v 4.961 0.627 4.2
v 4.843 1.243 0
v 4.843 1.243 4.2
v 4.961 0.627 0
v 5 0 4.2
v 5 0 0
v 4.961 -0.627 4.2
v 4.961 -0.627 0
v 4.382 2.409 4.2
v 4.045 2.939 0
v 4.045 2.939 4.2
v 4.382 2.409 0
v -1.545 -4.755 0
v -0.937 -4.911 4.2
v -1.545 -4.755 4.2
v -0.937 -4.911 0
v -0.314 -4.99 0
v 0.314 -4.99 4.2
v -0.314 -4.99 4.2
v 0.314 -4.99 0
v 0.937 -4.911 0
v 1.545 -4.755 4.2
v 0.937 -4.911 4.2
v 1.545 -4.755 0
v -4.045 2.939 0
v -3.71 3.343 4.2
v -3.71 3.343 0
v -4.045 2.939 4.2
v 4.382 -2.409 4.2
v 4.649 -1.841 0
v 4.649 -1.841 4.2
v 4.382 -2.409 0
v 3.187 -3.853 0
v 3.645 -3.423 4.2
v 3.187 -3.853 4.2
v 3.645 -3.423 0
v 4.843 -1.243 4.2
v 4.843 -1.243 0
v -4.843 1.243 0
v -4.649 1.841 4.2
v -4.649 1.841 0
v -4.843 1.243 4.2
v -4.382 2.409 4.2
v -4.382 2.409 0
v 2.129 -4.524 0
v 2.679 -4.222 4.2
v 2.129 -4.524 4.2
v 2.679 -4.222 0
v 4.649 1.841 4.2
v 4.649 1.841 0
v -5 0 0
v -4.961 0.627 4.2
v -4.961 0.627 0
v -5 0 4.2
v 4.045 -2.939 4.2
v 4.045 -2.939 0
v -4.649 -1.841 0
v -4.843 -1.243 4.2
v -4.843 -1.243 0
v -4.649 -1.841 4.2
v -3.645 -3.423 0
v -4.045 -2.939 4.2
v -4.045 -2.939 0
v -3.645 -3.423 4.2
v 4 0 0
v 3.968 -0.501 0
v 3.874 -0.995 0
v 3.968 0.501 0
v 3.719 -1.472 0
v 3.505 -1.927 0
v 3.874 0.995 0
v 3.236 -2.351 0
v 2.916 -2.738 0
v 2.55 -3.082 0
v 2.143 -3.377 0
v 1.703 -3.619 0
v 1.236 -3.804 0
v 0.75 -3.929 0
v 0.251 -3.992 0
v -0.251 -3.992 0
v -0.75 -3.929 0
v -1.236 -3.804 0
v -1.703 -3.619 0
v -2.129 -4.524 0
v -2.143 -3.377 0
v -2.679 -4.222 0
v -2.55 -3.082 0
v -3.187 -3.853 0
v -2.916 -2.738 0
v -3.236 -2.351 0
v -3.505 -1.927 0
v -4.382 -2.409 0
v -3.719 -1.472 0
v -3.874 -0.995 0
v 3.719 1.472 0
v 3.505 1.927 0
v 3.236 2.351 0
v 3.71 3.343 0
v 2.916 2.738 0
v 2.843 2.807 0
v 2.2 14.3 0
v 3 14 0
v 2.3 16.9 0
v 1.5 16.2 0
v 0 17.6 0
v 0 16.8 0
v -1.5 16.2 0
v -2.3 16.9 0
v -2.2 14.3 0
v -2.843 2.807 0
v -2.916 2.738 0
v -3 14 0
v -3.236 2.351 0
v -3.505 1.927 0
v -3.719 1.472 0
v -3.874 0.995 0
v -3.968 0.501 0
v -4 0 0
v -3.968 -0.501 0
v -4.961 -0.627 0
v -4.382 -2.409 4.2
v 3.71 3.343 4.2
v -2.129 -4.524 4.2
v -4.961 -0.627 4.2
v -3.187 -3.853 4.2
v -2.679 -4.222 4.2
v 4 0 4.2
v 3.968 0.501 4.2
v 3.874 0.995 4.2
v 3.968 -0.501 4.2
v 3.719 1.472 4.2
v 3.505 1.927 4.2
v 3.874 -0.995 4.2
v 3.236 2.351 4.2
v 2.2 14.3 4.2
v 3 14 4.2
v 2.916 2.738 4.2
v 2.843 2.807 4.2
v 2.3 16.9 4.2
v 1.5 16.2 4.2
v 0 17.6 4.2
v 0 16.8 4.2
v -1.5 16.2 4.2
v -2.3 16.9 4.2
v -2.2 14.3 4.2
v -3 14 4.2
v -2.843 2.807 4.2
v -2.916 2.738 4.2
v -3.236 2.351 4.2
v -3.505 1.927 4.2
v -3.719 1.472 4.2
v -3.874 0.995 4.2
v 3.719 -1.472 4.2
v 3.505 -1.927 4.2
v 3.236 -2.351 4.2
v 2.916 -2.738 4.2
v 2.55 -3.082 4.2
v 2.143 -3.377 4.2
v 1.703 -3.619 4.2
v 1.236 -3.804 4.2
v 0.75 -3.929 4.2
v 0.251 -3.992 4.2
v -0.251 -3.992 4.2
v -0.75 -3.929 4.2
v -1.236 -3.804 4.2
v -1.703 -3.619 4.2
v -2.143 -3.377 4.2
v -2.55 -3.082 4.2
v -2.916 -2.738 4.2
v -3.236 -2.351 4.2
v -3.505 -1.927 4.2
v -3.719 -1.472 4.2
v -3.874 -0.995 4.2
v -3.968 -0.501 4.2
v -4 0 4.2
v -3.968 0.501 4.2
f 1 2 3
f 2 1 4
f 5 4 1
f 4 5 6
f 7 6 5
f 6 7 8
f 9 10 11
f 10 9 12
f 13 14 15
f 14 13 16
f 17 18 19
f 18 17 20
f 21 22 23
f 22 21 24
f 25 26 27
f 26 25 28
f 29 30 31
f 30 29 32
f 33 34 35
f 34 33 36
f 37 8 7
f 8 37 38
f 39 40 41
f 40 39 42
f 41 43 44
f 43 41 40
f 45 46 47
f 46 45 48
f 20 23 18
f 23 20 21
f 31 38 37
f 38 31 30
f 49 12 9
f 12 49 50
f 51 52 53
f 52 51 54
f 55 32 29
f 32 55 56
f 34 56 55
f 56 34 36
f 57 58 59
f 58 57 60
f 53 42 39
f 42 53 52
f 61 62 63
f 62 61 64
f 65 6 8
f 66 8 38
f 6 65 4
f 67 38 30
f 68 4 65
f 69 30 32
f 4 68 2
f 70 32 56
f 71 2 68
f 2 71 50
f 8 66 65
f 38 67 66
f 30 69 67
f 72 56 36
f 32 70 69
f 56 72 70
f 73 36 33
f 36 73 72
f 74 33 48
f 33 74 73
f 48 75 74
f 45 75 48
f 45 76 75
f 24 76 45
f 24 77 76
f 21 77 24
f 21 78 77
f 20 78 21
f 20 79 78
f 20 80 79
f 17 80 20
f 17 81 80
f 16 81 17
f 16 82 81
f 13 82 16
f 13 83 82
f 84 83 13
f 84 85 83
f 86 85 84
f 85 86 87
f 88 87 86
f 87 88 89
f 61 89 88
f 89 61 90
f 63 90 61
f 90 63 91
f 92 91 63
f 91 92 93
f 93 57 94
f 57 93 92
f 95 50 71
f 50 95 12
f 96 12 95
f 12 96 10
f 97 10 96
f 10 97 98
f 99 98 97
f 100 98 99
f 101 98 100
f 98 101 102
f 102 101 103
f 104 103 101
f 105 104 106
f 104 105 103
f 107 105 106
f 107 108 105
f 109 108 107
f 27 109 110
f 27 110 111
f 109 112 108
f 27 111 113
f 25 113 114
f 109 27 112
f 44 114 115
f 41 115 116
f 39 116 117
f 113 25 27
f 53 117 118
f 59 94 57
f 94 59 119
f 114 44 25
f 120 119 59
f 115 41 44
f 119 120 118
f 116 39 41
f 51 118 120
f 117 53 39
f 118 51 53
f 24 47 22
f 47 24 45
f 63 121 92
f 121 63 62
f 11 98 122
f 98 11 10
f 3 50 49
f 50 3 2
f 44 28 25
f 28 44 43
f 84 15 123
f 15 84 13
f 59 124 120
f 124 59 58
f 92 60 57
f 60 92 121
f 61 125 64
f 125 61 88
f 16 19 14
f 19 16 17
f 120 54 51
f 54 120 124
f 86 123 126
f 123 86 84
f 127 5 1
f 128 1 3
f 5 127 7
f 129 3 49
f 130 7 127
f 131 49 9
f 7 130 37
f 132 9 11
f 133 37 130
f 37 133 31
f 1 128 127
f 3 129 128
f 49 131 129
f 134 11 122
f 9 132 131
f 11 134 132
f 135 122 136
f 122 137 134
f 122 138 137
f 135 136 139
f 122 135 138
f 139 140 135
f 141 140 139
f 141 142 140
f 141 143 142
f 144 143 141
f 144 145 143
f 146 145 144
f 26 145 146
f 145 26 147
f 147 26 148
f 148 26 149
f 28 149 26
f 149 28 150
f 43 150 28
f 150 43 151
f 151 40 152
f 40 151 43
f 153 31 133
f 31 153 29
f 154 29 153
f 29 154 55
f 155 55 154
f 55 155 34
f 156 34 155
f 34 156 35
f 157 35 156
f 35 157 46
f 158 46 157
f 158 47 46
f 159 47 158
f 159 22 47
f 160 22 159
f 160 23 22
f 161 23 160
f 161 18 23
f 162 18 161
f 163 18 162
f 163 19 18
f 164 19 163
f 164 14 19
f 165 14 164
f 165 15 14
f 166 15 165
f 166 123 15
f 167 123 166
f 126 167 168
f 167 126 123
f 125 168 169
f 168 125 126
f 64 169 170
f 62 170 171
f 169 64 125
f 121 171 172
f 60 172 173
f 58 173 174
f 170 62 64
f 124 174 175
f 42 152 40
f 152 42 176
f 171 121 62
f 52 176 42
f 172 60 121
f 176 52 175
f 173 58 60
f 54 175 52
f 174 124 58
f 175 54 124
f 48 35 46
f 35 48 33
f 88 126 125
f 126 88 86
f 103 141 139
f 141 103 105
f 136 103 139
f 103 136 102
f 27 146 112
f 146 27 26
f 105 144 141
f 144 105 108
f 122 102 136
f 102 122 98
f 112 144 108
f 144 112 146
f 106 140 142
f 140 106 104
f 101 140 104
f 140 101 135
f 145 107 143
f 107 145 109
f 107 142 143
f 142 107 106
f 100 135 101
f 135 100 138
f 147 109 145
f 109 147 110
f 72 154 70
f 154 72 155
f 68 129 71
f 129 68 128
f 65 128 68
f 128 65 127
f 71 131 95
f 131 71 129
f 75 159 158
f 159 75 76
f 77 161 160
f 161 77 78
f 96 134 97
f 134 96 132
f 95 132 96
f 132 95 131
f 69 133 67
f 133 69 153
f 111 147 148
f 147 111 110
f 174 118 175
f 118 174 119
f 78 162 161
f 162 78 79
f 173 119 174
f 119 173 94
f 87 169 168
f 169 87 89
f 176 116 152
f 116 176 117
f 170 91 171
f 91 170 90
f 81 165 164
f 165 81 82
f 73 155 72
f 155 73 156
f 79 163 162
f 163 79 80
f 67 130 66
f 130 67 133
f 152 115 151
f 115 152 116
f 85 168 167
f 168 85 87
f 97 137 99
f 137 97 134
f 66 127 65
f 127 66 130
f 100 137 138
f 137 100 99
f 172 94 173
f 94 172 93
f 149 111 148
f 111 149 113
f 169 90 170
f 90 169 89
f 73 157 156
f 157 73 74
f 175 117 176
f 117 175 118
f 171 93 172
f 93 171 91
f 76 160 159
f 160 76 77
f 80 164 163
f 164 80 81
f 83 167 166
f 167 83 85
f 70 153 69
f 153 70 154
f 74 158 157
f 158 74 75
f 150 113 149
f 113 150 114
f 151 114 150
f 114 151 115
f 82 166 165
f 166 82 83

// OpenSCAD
$fn=50;

difference(){

    union(){
        cylinder(d=10, 4.2);
        linear_extrude(4.2){
            polygon([[-4,-1],[-3,14],[-2.3,16.9],[0,17.6],[2.3,16.9],[3,14],[4,-1]]);
        }
    }

    translate([0,0,-.1]){
        linear_extrude(5){
        polygon([[-3,0],[-2.2,14.3],[-1.5,16.2],[0,16.8],[1.5,16.2],[2.2,14.3],[3,0]]);
        }
    }
    
    cylinder(d=8, 10, center=true);
}
